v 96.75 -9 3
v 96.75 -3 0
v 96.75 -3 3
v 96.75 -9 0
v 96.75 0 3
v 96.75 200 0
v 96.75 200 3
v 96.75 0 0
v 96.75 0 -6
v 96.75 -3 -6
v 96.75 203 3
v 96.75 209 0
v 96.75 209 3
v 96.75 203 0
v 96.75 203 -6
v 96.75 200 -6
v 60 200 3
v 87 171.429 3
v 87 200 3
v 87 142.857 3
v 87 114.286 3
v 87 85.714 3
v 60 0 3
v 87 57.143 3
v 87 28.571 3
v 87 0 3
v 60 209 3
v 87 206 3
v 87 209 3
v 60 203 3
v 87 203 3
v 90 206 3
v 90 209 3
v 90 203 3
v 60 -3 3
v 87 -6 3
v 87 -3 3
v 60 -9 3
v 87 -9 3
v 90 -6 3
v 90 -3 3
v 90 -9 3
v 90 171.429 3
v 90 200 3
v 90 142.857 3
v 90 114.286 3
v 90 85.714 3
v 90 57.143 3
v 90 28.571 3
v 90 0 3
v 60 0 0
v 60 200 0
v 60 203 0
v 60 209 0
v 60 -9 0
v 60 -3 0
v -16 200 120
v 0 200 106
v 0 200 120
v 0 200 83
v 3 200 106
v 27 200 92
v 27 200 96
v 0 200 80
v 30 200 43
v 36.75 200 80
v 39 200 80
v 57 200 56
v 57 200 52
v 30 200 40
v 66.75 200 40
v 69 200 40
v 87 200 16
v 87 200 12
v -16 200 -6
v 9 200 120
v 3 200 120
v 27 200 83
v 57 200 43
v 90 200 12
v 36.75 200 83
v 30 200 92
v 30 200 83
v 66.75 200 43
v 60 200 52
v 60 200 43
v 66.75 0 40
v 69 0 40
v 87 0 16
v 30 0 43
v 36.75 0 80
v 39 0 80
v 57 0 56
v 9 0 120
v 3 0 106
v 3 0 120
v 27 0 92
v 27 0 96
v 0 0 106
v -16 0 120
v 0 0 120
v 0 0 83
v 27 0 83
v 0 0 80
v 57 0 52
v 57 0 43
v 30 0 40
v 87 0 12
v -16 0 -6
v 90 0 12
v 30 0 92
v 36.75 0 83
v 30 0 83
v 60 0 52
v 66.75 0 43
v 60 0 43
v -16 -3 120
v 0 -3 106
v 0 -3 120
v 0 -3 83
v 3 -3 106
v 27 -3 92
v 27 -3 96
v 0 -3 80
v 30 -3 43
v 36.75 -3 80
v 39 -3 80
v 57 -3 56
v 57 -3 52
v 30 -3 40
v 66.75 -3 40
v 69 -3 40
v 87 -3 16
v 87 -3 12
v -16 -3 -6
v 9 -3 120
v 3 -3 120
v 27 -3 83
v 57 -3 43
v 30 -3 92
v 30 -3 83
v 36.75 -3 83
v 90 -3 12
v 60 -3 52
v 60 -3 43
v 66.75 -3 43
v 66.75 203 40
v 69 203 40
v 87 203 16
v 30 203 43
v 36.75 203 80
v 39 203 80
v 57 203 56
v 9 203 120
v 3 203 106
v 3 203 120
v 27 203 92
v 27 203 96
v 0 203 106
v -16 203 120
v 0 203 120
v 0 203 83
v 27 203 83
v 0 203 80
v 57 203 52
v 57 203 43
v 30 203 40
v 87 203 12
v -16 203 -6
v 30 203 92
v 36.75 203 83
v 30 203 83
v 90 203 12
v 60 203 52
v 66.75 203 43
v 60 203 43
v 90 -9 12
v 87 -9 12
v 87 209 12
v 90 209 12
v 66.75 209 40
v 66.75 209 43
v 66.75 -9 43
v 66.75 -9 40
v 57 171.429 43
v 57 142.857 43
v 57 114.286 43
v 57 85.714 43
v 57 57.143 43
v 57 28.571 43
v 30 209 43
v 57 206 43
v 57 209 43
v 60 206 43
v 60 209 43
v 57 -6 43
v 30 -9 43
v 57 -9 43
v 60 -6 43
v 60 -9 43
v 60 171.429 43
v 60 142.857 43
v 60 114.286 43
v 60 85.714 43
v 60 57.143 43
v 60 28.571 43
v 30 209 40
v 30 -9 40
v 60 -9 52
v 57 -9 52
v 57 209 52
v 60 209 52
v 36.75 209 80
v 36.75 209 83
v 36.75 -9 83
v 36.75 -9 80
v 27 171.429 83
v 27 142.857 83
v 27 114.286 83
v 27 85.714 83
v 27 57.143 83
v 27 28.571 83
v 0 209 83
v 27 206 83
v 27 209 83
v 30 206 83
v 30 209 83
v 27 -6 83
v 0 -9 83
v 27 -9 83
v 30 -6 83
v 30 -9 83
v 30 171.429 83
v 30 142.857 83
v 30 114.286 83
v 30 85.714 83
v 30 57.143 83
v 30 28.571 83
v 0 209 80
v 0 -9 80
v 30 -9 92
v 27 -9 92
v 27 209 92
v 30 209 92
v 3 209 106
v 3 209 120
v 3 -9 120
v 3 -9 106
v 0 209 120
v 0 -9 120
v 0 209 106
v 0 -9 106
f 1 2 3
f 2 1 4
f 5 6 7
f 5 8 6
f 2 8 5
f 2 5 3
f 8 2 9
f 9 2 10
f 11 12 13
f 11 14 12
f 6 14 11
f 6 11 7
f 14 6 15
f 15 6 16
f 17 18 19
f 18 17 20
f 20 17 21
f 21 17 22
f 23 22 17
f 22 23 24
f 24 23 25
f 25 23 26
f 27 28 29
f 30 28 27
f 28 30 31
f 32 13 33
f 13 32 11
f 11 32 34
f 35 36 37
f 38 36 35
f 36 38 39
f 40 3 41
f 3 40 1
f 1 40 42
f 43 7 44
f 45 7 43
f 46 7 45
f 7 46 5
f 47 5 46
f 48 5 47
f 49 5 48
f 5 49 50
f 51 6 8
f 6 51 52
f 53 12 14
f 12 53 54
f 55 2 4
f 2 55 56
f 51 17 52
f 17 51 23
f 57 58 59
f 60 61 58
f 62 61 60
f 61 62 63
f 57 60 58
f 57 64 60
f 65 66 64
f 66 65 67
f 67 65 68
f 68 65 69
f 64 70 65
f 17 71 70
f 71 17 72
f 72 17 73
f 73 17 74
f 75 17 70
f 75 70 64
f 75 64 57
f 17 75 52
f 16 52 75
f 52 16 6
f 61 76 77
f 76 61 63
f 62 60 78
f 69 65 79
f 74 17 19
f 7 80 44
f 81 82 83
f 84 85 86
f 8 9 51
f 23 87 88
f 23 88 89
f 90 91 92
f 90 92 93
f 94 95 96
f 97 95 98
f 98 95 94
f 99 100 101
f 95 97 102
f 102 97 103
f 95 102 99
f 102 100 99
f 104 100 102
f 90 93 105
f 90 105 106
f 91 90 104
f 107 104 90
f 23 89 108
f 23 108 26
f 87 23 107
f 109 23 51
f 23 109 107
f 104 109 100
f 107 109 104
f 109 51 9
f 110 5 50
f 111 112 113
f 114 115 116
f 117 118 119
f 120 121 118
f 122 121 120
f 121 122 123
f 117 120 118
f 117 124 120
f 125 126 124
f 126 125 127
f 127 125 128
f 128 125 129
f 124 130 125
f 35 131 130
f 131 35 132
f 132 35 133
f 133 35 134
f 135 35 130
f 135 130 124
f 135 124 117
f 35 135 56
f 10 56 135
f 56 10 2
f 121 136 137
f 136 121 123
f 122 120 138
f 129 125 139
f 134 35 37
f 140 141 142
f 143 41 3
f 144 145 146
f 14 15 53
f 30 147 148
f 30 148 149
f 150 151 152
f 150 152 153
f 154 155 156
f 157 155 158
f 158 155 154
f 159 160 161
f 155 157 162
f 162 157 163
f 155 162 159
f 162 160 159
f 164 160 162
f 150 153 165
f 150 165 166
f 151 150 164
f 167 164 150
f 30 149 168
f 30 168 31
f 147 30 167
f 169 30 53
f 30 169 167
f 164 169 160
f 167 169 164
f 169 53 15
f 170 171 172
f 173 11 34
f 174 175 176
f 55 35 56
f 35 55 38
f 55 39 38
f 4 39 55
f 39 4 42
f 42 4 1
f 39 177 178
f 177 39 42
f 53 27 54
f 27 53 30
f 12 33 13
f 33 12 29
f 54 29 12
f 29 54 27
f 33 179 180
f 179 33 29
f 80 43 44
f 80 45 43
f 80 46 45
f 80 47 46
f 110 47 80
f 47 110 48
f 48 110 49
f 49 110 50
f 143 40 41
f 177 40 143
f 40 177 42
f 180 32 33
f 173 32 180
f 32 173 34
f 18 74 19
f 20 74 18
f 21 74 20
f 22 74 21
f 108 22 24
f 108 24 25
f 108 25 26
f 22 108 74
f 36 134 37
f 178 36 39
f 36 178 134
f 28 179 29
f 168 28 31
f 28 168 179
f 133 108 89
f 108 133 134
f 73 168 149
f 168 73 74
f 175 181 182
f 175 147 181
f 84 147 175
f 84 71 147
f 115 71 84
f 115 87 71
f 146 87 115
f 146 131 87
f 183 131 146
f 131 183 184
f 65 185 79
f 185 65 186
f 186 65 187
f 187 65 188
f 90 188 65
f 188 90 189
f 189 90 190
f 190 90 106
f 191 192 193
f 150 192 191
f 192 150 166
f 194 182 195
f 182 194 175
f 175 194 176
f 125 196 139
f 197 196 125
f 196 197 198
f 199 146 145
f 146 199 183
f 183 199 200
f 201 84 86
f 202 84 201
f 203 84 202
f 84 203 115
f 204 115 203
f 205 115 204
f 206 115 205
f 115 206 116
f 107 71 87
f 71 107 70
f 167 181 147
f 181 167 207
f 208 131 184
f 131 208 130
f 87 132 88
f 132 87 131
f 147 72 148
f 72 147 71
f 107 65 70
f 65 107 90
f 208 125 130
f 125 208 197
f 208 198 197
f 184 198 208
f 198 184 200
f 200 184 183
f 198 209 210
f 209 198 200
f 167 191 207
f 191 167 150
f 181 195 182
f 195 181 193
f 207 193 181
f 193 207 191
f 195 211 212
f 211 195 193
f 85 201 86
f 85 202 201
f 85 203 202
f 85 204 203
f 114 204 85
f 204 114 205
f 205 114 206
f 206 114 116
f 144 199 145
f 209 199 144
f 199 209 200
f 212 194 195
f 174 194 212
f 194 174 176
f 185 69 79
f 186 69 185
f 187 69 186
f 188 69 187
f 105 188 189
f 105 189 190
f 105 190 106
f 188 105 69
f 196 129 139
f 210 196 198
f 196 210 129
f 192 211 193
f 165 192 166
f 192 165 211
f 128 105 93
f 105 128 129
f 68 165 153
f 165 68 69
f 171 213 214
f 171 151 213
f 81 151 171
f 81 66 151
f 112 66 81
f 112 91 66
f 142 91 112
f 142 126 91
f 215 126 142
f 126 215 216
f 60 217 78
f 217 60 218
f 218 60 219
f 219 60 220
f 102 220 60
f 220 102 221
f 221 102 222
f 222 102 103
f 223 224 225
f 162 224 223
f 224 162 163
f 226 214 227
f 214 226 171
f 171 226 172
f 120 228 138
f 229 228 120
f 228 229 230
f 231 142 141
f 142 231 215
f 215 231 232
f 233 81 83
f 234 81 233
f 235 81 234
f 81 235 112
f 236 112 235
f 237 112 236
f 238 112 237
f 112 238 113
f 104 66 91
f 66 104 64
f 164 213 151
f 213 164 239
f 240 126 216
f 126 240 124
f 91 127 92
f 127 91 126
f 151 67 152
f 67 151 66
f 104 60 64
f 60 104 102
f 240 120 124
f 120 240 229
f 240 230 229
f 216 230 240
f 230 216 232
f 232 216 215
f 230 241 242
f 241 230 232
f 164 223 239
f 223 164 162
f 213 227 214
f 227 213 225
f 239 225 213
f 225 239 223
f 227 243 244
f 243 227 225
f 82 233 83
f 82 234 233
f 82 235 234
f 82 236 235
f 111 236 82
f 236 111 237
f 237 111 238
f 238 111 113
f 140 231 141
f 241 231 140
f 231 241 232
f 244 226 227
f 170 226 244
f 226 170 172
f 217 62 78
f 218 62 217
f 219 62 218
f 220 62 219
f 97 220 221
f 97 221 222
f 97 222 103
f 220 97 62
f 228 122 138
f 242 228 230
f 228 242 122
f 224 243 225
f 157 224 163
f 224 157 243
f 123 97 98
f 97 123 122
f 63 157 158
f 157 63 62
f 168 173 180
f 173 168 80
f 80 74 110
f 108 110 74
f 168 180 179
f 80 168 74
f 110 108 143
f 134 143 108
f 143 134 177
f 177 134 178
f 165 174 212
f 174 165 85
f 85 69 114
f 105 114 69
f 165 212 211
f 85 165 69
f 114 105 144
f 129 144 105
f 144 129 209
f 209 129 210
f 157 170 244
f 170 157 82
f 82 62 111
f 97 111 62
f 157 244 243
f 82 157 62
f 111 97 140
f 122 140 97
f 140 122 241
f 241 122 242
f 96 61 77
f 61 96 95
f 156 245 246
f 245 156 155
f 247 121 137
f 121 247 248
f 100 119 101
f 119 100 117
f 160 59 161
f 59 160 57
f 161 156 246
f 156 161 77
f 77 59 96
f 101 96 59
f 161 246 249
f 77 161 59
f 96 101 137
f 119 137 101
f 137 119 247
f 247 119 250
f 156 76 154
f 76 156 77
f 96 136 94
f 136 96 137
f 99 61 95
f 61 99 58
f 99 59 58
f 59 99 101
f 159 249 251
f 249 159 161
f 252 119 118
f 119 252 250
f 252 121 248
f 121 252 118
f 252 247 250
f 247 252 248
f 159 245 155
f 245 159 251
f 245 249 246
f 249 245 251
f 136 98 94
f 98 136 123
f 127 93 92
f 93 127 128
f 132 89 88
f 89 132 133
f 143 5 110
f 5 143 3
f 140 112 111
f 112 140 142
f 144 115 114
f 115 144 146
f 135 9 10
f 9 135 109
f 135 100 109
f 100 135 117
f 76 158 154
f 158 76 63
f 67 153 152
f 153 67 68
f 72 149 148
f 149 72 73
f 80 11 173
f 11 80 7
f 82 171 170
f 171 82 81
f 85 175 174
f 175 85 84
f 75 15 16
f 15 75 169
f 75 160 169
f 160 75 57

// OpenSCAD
/**
Configuration variables
**/
materialThicknessMM = 3;

noOfShelves = 3;

shelfDepthMM = 30;
shelfHeightMM = 40;
shelfWidthMM = 200;

lipHeightMM = 12;
lipTrackThicknessMM = 5;

slideEdgeSizeMM = 6;
noOfShelfTeeth = 7;

backPlateHeightMM = 14;

unitBaseHeightMM = 6;
unitBackDepthMM = 16;

debugColor = [111/255, 30/255, 81/255, 0.4];

/**
DO NOT EDIT THESE VALUES
**/
shelfAngle = atan(shelfHeightMM / shelfDepthMM);
sideIndentX = lipHeightMM / tan(shelfAngle);
frontExtensionMM = (lipHeightMM-materialThicknessMM) / tan(shelfAngle);

module shelfMarker() {
    triangleDepth = shelfDepthMM;
    triangleHeight = shelfHeightMM;
    triangleWidth = shelfWidthMM;
    
    createTriangle(triangleDepth, triangleWidth, triangleHeight);
}

module shelfMarkers() {
    for (i = [1 : noOfShelves]) {
        xOffset = (noOfShelves - i) * shelfDepthMM;
        zOffset = (i - 1) * shelfHeightMM;
        translate([xOffset, 0, zOffset]) {
            shelfMarker();
        }
    }
}

module sideMarker() {
    translate([sideIndentX, shelfWidthMM / 2, 0]) {
    createTriangle(shelfDepthMM * noOfShelves, 1, shelfHeightMM * noOfShelves);
    }
}

module printDebug() {
    color(debugColor) shelfMarkers();
    color(debugColor) sideMarker();
}


module createTriangle(triangleDepth, triangleWidth, triangleHeight) {
    polyhedron(
        points = [
            /* Top Left    0 */ [0, 0, triangleHeight],
            /* Front Left  1 */ [triangleDepth, 0, 0], 
            /* Back Left   2 */ [0, 0, 0],
            /* Top Right   3 */ [0, triangleWidth, triangleHeight],
            /* Front Right 4 */ [triangleDepth, triangleWidth, 0],
            /* Back Right  5 */ [0, triangleWidth, 0],
        ],
        faces = [
            /* Left Face   */ [0, 1, 2],
            /* Right Face  */ [5, 4, 3],
            /* Bottom Face */ [2, 1, 4, 5],
            /* Back Face   */ [3, 0, 2, 5],
            /* Front Face  */ [0, 3, 4, 1],
        ]
    );
}

module createTeeth(on, width, noOfTeeth, flatPiece) {
    toothWidth = width / noOfTeeth;
    for (i = [0 : noOfTeeth - 1]) {
        if (on && i % 2 == 0) {
        translate([-materialThicknessMM, toothWidth * i, -materialThicknessMM]) {
        if (flatPiece) {
            cube([materialThicknessMM * 2, toothWidth, materialThicknessMM * 3]);
        } else {
            cube([materialThicknessMM * 3, toothWidth, materialThicknessMM * 2]);
        }
        }
        } else if (on == false && i % 2 == 1) {
        translate([-materialThicknessMM, toothWidth * i, -materialThicknessMM]) {
        if (flatPiece) {
            cube([materialThicknessMM * 2, toothWidth, materialThicknessMM * 3]);
        } else {
            cube([materialThicknessMM * 3, toothWidth, materialThicknessMM * 2]);
        }
        }
        }
    }
}

module basePiece() {
    halfShelfDepth = shelfDepthMM / 2;
    
    difference() {
    
    union() {
    cube([shelfDepthMM + frontExtensionMM, shelfWidthMM, materialThicknessMM]);
    
    // Left slide path
    translate([halfShelfDepth, -materialThicknessMM, 0]) {
    cube([halfShelfDepth + frontExtensionMM, materialThicknessMM, materialThicknessMM]);
    }
    
    // Right slide path
    translate([halfShelfDepth, shelfWidthMM, 0]) {
    cube([halfShelfDepth + frontExtensionMM, materialThicknessMM, materialThicknessMM]);
    }
    
    // Left slide edge
    translate([0, -materialThicknessMM-slideEdgeSizeMM, 0]) {
    cube([shelfDepthMM + frontExtensionMM, slideEdgeSizeMM, materialThicknessMM]);
    }
    
    // Right slide edge
    translate([0, shelfWidthMM+materialThicknessMM, 0]) {
    cube([shelfDepthMM + frontExtensionMM, slideEdgeSizeMM, materialThicknessMM]);
    }
    }
    
    // Create teeth in middle of shelf
    translate([shelfDepthMM, 0, 0]) {
    toothWidth = shelfWidthMM / noOfShelfTeeth;
    for (i = [0 : noOfShelfTeeth - 1]) {
        if (i % 2 == 1) {
        translate([-materialThicknessMM, toothWidth * i, -materialThicknessMM]) {
            cube([materialThicknessMM, toothWidth, materialThicknessMM * 3]);
        }
        }
    }
    }
    
    // Create left hole for lip
    translate([shelfDepthMM-materialThicknessMM, -materialThicknessMM-slideEdgeSizeMM/2, -materialThicknessMM]) {
    cube([materialThicknessMM, slideEdgeSizeMM/2, materialThicknessMM * 3]);
    }
    
    // Create right hole for lip
    translate([shelfDepthMM-materialThicknessMM, shelfWidthMM+materialThicknessMM, -materialThicknessMM]) {
    cube([materialThicknessMM, slideEdgeSizeMM/2, materialThicknessMM * 3]);
    }
    
    }
}

module bases() {    
    for (i = [1 : noOfShelves]) {
        xOffset = (noOfShelves - i) * shelfDepthMM;
        zOffset = (i - 1) * shelfHeightMM;
        translate([xOffset, 0, zOffset]) {
            color([18/255, 203/255, 196/255]) basePiece();
        }
    }
}


module lipPiece() {
    difference() {
    
    union() {
    cube([materialThicknessMM, shelfWidthMM, lipHeightMM]);
    
    // Left slide path
    translate([0, -materialThicknessMM, lipHeightMM - lipTrackThicknessMM]) {
    cube([materialThicknessMM, materialThicknessMM, lipTrackThicknessMM]);
    }
    
    // Right slide path
    translate([0, shelfWidthMM, lipHeightMM - lipTrackThicknessMM]) {
    cube([materialThicknessMM, materialThicknessMM, lipTrackThicknessMM]);
    }
    
    // Left slide edge
    translate([0, -materialThicknessMM-slideEdgeSizeMM, 0]) {
    cube([materialThicknessMM, slideEdgeSizeMM, lipHeightMM]);
    }
    
    // Right slide edge
    translate([0, shelfWidthMM + materialThicknessMM, 0]) {
    cube([materialThicknessMM, slideEdgeSizeMM, lipHeightMM]);
    }
    }
    
    translate([0, 0, 0]) {
    createTeeth(true, shelfWidthMM, noOfShelfTeeth, false);
    }
    
    // Remove left indent
    translate([-materialThicknessMM, -materialThicknessMM-slideEdgeSizeMM-materialThicknessMM, -materialThicknessMM]) {
    cube([materialThicknessMM * 3, (slideEdgeSizeMM / 2) + materialThicknessMM, materialThicknessMM * 2]);
    }
    
    // Remove right indent
    translate([-materialThicknessMM, shelfWidthMM+materialThicknessMM+slideEdgeSizeMM-materialThicknessMM, -materialThicknessMM]) {
    cube([materialThicknessMM * 3, (slideEdgeSizeMM / 2) + materialThicknessMM, materialThicknessMM * 2]);
    }
    
    }
}

module lips() {
    for (i = [1 : noOfShelves]) {
        xOffset = ((noOfShelves - i + 1) * shelfDepthMM) - materialThicknessMM;
        zOffset = (i - 1) * shelfHeightMM;
        translate([xOffset, 0, zOffset]) {
            color([6/255, 82/255, 221/255]) lipPiece();
        }
    }
}

module backPlatePiece() {
    union() {
    
    translate([0, 0, 0]) {
    cube([materialThicknessMM, shelfWidthMM, backPlateHeightMM]);
    }
    
    // Left track
    translate([0, -materialThicknessMM, backPlateHeightMM / 2]) {
    cube([materialThicknessMM, materialThicknessMM, backPlateHeightMM / 2]);
    }
    
    // Right track
    translate([0, shelfWidthMM, backPlateHeightMM /2]) {
    cube([materialThicknessMM, materialThicknessMM, backPlateHeightMM / 2]);
    }
    
    // Left edge
    translate([0, -materialThicknessMM-slideEdgeSizeMM, 0]) {
    cube([materialThicknessMM, slideEdgeSizeMM, backPlateHeightMM]);
    }
    
    // Right edge
    translate([0, shelfWidthMM+materialThicknessMM, 0]) {
    cube([materialThicknessMM, slideEdgeSizeMM, backPlateHeightMM]);
    }
    
    }
}

module backPlate() {
    fullHeight = shelfHeightMM * noOfShelves;
    translate([0, 0, fullHeight - backPlateHeightMM]) {
    color([237/255, 76/255, 103/255]) backPlatePiece();
    }
}

module sidePiece() {
    fullHeight = shelfHeightMM * noOfShelves;
    fullDepth = shelfDepthMM * noOfShelves;
    width = materialThicknessMM;
    
    difference() {
    
    union() {
    translate([sideIndentX, 0, 0]) {
    polyhedron(
        points = [
            /* Top Left    0 */ [0, 0, fullHeight],
            /* Front Left  1 */ [fullDepth, 0, 0], 
            /* Back Left   2 */ [0, 0, 0],
            /* Top Right   3 */ [0, width, fullHeight],
            /* Front Right 4 */ [fullDepth, width, 0],
            /* Back Right  5 */ [0, width, 0],
        ],
        faces = [
            /* Left Face   */ [0, 1, 2],
            /* Right Face  */ [5, 4, 3],
            /* Bottom Face */ [2, 1, 4, 5],
            /* Back Face   */ [3, 0, 2, 5],
            /* Front Face  */ [0, 3, 4, 1],
        ]
    );
    }
    
    cube([sideIndentX, materialThicknessMM, fullHeight]);
    
    // Base of the unit
    translate([0, 0, -unitBaseHeightMM]) {
    cube([fullDepth + frontExtensionMM, materialThicknessMM, unitBaseHeightMM]);
    }
    
    // Back of unit
    translate([-unitBackDepthMM, 0, -unitBaseHeightMM]) {
    cube([unitBackDepthMM, materialThicknessMM, fullHeight + unitBaseHeightMM]);
    }
    }
    
    // Cuts out the track for the base
    trackDepth = shelfDepthMM / 2;
    for (i = [1 : noOfShelves]) {
        trackZ = shelfHeightMM * (noOfShelves - i);
        translate([(shelfDepthMM * i) - trackDepth, -materialThicknessMM, trackZ]) {
        cube([trackDepth + sideIndentX, materialThicknessMM*3, materialThicknessMM]);
        }
    }
    
    // Cuts out the track for the lip
    trackHeight = lipTrackThicknessMM + sideIndentX;
    for (i = [1 : noOfShelves]) {
        trackZ = (shelfHeightMM * (noOfShelves - i)) + (lipHeightMM - lipTrackThicknessMM);
        translate([(shelfDepthMM * i) - materialThicknessMM, -materialThicknessMM, trackZ]) {
        cube([materialThicknessMM, materialThicknessMM * 3, trackHeight]);
        }
    }
    
    translate([0, -materialThicknessMM, fullHeight - (backPlateHeightMM / 2)]) {
    cube([materialThicknessMM, materialThicknessMM * 3, backPlateHeightMM / 2]);
    }
    
    // Remove the tip of the front triangle
    translate([fullDepth + frontExtensionMM, -materialThicknessMM, 0]) {
    cube([fullDepth, materialThicknessMM * 3, fullHeight]);
    }
    
    }
}

module sides() {
    translate([0, -materialThicknessMM, 0]) {
    color([163/255, 203/255, 56/255]) sidePiece();
    }
    
    translate([0, shelfWidthMM, 0]) {
    color([163/255, 203/255, 56/255, 1]) sidePiece();
    }
}

// printDebug();

createProjection = false;
if (createProjection) {
    padding = 4;
    
    projection(cut = false) {
    rotate([0, 90, 0]) backPlatePiece();
    translate([backPlateHeightMM + padding, 0, 0]) rotate([0, 90, 0]) lipPiece();
    translate([backPlateHeightMM + lipHeightMM + padding * 2, 0, 0]) basePiece();
    translate([-slideEdgeSizeMM - padding, 0, 0]) rotate([-90, -180, 0]) sidePiece();
    }
} else {
    bases();
    lips();
    backPlate();
    sides();
}
